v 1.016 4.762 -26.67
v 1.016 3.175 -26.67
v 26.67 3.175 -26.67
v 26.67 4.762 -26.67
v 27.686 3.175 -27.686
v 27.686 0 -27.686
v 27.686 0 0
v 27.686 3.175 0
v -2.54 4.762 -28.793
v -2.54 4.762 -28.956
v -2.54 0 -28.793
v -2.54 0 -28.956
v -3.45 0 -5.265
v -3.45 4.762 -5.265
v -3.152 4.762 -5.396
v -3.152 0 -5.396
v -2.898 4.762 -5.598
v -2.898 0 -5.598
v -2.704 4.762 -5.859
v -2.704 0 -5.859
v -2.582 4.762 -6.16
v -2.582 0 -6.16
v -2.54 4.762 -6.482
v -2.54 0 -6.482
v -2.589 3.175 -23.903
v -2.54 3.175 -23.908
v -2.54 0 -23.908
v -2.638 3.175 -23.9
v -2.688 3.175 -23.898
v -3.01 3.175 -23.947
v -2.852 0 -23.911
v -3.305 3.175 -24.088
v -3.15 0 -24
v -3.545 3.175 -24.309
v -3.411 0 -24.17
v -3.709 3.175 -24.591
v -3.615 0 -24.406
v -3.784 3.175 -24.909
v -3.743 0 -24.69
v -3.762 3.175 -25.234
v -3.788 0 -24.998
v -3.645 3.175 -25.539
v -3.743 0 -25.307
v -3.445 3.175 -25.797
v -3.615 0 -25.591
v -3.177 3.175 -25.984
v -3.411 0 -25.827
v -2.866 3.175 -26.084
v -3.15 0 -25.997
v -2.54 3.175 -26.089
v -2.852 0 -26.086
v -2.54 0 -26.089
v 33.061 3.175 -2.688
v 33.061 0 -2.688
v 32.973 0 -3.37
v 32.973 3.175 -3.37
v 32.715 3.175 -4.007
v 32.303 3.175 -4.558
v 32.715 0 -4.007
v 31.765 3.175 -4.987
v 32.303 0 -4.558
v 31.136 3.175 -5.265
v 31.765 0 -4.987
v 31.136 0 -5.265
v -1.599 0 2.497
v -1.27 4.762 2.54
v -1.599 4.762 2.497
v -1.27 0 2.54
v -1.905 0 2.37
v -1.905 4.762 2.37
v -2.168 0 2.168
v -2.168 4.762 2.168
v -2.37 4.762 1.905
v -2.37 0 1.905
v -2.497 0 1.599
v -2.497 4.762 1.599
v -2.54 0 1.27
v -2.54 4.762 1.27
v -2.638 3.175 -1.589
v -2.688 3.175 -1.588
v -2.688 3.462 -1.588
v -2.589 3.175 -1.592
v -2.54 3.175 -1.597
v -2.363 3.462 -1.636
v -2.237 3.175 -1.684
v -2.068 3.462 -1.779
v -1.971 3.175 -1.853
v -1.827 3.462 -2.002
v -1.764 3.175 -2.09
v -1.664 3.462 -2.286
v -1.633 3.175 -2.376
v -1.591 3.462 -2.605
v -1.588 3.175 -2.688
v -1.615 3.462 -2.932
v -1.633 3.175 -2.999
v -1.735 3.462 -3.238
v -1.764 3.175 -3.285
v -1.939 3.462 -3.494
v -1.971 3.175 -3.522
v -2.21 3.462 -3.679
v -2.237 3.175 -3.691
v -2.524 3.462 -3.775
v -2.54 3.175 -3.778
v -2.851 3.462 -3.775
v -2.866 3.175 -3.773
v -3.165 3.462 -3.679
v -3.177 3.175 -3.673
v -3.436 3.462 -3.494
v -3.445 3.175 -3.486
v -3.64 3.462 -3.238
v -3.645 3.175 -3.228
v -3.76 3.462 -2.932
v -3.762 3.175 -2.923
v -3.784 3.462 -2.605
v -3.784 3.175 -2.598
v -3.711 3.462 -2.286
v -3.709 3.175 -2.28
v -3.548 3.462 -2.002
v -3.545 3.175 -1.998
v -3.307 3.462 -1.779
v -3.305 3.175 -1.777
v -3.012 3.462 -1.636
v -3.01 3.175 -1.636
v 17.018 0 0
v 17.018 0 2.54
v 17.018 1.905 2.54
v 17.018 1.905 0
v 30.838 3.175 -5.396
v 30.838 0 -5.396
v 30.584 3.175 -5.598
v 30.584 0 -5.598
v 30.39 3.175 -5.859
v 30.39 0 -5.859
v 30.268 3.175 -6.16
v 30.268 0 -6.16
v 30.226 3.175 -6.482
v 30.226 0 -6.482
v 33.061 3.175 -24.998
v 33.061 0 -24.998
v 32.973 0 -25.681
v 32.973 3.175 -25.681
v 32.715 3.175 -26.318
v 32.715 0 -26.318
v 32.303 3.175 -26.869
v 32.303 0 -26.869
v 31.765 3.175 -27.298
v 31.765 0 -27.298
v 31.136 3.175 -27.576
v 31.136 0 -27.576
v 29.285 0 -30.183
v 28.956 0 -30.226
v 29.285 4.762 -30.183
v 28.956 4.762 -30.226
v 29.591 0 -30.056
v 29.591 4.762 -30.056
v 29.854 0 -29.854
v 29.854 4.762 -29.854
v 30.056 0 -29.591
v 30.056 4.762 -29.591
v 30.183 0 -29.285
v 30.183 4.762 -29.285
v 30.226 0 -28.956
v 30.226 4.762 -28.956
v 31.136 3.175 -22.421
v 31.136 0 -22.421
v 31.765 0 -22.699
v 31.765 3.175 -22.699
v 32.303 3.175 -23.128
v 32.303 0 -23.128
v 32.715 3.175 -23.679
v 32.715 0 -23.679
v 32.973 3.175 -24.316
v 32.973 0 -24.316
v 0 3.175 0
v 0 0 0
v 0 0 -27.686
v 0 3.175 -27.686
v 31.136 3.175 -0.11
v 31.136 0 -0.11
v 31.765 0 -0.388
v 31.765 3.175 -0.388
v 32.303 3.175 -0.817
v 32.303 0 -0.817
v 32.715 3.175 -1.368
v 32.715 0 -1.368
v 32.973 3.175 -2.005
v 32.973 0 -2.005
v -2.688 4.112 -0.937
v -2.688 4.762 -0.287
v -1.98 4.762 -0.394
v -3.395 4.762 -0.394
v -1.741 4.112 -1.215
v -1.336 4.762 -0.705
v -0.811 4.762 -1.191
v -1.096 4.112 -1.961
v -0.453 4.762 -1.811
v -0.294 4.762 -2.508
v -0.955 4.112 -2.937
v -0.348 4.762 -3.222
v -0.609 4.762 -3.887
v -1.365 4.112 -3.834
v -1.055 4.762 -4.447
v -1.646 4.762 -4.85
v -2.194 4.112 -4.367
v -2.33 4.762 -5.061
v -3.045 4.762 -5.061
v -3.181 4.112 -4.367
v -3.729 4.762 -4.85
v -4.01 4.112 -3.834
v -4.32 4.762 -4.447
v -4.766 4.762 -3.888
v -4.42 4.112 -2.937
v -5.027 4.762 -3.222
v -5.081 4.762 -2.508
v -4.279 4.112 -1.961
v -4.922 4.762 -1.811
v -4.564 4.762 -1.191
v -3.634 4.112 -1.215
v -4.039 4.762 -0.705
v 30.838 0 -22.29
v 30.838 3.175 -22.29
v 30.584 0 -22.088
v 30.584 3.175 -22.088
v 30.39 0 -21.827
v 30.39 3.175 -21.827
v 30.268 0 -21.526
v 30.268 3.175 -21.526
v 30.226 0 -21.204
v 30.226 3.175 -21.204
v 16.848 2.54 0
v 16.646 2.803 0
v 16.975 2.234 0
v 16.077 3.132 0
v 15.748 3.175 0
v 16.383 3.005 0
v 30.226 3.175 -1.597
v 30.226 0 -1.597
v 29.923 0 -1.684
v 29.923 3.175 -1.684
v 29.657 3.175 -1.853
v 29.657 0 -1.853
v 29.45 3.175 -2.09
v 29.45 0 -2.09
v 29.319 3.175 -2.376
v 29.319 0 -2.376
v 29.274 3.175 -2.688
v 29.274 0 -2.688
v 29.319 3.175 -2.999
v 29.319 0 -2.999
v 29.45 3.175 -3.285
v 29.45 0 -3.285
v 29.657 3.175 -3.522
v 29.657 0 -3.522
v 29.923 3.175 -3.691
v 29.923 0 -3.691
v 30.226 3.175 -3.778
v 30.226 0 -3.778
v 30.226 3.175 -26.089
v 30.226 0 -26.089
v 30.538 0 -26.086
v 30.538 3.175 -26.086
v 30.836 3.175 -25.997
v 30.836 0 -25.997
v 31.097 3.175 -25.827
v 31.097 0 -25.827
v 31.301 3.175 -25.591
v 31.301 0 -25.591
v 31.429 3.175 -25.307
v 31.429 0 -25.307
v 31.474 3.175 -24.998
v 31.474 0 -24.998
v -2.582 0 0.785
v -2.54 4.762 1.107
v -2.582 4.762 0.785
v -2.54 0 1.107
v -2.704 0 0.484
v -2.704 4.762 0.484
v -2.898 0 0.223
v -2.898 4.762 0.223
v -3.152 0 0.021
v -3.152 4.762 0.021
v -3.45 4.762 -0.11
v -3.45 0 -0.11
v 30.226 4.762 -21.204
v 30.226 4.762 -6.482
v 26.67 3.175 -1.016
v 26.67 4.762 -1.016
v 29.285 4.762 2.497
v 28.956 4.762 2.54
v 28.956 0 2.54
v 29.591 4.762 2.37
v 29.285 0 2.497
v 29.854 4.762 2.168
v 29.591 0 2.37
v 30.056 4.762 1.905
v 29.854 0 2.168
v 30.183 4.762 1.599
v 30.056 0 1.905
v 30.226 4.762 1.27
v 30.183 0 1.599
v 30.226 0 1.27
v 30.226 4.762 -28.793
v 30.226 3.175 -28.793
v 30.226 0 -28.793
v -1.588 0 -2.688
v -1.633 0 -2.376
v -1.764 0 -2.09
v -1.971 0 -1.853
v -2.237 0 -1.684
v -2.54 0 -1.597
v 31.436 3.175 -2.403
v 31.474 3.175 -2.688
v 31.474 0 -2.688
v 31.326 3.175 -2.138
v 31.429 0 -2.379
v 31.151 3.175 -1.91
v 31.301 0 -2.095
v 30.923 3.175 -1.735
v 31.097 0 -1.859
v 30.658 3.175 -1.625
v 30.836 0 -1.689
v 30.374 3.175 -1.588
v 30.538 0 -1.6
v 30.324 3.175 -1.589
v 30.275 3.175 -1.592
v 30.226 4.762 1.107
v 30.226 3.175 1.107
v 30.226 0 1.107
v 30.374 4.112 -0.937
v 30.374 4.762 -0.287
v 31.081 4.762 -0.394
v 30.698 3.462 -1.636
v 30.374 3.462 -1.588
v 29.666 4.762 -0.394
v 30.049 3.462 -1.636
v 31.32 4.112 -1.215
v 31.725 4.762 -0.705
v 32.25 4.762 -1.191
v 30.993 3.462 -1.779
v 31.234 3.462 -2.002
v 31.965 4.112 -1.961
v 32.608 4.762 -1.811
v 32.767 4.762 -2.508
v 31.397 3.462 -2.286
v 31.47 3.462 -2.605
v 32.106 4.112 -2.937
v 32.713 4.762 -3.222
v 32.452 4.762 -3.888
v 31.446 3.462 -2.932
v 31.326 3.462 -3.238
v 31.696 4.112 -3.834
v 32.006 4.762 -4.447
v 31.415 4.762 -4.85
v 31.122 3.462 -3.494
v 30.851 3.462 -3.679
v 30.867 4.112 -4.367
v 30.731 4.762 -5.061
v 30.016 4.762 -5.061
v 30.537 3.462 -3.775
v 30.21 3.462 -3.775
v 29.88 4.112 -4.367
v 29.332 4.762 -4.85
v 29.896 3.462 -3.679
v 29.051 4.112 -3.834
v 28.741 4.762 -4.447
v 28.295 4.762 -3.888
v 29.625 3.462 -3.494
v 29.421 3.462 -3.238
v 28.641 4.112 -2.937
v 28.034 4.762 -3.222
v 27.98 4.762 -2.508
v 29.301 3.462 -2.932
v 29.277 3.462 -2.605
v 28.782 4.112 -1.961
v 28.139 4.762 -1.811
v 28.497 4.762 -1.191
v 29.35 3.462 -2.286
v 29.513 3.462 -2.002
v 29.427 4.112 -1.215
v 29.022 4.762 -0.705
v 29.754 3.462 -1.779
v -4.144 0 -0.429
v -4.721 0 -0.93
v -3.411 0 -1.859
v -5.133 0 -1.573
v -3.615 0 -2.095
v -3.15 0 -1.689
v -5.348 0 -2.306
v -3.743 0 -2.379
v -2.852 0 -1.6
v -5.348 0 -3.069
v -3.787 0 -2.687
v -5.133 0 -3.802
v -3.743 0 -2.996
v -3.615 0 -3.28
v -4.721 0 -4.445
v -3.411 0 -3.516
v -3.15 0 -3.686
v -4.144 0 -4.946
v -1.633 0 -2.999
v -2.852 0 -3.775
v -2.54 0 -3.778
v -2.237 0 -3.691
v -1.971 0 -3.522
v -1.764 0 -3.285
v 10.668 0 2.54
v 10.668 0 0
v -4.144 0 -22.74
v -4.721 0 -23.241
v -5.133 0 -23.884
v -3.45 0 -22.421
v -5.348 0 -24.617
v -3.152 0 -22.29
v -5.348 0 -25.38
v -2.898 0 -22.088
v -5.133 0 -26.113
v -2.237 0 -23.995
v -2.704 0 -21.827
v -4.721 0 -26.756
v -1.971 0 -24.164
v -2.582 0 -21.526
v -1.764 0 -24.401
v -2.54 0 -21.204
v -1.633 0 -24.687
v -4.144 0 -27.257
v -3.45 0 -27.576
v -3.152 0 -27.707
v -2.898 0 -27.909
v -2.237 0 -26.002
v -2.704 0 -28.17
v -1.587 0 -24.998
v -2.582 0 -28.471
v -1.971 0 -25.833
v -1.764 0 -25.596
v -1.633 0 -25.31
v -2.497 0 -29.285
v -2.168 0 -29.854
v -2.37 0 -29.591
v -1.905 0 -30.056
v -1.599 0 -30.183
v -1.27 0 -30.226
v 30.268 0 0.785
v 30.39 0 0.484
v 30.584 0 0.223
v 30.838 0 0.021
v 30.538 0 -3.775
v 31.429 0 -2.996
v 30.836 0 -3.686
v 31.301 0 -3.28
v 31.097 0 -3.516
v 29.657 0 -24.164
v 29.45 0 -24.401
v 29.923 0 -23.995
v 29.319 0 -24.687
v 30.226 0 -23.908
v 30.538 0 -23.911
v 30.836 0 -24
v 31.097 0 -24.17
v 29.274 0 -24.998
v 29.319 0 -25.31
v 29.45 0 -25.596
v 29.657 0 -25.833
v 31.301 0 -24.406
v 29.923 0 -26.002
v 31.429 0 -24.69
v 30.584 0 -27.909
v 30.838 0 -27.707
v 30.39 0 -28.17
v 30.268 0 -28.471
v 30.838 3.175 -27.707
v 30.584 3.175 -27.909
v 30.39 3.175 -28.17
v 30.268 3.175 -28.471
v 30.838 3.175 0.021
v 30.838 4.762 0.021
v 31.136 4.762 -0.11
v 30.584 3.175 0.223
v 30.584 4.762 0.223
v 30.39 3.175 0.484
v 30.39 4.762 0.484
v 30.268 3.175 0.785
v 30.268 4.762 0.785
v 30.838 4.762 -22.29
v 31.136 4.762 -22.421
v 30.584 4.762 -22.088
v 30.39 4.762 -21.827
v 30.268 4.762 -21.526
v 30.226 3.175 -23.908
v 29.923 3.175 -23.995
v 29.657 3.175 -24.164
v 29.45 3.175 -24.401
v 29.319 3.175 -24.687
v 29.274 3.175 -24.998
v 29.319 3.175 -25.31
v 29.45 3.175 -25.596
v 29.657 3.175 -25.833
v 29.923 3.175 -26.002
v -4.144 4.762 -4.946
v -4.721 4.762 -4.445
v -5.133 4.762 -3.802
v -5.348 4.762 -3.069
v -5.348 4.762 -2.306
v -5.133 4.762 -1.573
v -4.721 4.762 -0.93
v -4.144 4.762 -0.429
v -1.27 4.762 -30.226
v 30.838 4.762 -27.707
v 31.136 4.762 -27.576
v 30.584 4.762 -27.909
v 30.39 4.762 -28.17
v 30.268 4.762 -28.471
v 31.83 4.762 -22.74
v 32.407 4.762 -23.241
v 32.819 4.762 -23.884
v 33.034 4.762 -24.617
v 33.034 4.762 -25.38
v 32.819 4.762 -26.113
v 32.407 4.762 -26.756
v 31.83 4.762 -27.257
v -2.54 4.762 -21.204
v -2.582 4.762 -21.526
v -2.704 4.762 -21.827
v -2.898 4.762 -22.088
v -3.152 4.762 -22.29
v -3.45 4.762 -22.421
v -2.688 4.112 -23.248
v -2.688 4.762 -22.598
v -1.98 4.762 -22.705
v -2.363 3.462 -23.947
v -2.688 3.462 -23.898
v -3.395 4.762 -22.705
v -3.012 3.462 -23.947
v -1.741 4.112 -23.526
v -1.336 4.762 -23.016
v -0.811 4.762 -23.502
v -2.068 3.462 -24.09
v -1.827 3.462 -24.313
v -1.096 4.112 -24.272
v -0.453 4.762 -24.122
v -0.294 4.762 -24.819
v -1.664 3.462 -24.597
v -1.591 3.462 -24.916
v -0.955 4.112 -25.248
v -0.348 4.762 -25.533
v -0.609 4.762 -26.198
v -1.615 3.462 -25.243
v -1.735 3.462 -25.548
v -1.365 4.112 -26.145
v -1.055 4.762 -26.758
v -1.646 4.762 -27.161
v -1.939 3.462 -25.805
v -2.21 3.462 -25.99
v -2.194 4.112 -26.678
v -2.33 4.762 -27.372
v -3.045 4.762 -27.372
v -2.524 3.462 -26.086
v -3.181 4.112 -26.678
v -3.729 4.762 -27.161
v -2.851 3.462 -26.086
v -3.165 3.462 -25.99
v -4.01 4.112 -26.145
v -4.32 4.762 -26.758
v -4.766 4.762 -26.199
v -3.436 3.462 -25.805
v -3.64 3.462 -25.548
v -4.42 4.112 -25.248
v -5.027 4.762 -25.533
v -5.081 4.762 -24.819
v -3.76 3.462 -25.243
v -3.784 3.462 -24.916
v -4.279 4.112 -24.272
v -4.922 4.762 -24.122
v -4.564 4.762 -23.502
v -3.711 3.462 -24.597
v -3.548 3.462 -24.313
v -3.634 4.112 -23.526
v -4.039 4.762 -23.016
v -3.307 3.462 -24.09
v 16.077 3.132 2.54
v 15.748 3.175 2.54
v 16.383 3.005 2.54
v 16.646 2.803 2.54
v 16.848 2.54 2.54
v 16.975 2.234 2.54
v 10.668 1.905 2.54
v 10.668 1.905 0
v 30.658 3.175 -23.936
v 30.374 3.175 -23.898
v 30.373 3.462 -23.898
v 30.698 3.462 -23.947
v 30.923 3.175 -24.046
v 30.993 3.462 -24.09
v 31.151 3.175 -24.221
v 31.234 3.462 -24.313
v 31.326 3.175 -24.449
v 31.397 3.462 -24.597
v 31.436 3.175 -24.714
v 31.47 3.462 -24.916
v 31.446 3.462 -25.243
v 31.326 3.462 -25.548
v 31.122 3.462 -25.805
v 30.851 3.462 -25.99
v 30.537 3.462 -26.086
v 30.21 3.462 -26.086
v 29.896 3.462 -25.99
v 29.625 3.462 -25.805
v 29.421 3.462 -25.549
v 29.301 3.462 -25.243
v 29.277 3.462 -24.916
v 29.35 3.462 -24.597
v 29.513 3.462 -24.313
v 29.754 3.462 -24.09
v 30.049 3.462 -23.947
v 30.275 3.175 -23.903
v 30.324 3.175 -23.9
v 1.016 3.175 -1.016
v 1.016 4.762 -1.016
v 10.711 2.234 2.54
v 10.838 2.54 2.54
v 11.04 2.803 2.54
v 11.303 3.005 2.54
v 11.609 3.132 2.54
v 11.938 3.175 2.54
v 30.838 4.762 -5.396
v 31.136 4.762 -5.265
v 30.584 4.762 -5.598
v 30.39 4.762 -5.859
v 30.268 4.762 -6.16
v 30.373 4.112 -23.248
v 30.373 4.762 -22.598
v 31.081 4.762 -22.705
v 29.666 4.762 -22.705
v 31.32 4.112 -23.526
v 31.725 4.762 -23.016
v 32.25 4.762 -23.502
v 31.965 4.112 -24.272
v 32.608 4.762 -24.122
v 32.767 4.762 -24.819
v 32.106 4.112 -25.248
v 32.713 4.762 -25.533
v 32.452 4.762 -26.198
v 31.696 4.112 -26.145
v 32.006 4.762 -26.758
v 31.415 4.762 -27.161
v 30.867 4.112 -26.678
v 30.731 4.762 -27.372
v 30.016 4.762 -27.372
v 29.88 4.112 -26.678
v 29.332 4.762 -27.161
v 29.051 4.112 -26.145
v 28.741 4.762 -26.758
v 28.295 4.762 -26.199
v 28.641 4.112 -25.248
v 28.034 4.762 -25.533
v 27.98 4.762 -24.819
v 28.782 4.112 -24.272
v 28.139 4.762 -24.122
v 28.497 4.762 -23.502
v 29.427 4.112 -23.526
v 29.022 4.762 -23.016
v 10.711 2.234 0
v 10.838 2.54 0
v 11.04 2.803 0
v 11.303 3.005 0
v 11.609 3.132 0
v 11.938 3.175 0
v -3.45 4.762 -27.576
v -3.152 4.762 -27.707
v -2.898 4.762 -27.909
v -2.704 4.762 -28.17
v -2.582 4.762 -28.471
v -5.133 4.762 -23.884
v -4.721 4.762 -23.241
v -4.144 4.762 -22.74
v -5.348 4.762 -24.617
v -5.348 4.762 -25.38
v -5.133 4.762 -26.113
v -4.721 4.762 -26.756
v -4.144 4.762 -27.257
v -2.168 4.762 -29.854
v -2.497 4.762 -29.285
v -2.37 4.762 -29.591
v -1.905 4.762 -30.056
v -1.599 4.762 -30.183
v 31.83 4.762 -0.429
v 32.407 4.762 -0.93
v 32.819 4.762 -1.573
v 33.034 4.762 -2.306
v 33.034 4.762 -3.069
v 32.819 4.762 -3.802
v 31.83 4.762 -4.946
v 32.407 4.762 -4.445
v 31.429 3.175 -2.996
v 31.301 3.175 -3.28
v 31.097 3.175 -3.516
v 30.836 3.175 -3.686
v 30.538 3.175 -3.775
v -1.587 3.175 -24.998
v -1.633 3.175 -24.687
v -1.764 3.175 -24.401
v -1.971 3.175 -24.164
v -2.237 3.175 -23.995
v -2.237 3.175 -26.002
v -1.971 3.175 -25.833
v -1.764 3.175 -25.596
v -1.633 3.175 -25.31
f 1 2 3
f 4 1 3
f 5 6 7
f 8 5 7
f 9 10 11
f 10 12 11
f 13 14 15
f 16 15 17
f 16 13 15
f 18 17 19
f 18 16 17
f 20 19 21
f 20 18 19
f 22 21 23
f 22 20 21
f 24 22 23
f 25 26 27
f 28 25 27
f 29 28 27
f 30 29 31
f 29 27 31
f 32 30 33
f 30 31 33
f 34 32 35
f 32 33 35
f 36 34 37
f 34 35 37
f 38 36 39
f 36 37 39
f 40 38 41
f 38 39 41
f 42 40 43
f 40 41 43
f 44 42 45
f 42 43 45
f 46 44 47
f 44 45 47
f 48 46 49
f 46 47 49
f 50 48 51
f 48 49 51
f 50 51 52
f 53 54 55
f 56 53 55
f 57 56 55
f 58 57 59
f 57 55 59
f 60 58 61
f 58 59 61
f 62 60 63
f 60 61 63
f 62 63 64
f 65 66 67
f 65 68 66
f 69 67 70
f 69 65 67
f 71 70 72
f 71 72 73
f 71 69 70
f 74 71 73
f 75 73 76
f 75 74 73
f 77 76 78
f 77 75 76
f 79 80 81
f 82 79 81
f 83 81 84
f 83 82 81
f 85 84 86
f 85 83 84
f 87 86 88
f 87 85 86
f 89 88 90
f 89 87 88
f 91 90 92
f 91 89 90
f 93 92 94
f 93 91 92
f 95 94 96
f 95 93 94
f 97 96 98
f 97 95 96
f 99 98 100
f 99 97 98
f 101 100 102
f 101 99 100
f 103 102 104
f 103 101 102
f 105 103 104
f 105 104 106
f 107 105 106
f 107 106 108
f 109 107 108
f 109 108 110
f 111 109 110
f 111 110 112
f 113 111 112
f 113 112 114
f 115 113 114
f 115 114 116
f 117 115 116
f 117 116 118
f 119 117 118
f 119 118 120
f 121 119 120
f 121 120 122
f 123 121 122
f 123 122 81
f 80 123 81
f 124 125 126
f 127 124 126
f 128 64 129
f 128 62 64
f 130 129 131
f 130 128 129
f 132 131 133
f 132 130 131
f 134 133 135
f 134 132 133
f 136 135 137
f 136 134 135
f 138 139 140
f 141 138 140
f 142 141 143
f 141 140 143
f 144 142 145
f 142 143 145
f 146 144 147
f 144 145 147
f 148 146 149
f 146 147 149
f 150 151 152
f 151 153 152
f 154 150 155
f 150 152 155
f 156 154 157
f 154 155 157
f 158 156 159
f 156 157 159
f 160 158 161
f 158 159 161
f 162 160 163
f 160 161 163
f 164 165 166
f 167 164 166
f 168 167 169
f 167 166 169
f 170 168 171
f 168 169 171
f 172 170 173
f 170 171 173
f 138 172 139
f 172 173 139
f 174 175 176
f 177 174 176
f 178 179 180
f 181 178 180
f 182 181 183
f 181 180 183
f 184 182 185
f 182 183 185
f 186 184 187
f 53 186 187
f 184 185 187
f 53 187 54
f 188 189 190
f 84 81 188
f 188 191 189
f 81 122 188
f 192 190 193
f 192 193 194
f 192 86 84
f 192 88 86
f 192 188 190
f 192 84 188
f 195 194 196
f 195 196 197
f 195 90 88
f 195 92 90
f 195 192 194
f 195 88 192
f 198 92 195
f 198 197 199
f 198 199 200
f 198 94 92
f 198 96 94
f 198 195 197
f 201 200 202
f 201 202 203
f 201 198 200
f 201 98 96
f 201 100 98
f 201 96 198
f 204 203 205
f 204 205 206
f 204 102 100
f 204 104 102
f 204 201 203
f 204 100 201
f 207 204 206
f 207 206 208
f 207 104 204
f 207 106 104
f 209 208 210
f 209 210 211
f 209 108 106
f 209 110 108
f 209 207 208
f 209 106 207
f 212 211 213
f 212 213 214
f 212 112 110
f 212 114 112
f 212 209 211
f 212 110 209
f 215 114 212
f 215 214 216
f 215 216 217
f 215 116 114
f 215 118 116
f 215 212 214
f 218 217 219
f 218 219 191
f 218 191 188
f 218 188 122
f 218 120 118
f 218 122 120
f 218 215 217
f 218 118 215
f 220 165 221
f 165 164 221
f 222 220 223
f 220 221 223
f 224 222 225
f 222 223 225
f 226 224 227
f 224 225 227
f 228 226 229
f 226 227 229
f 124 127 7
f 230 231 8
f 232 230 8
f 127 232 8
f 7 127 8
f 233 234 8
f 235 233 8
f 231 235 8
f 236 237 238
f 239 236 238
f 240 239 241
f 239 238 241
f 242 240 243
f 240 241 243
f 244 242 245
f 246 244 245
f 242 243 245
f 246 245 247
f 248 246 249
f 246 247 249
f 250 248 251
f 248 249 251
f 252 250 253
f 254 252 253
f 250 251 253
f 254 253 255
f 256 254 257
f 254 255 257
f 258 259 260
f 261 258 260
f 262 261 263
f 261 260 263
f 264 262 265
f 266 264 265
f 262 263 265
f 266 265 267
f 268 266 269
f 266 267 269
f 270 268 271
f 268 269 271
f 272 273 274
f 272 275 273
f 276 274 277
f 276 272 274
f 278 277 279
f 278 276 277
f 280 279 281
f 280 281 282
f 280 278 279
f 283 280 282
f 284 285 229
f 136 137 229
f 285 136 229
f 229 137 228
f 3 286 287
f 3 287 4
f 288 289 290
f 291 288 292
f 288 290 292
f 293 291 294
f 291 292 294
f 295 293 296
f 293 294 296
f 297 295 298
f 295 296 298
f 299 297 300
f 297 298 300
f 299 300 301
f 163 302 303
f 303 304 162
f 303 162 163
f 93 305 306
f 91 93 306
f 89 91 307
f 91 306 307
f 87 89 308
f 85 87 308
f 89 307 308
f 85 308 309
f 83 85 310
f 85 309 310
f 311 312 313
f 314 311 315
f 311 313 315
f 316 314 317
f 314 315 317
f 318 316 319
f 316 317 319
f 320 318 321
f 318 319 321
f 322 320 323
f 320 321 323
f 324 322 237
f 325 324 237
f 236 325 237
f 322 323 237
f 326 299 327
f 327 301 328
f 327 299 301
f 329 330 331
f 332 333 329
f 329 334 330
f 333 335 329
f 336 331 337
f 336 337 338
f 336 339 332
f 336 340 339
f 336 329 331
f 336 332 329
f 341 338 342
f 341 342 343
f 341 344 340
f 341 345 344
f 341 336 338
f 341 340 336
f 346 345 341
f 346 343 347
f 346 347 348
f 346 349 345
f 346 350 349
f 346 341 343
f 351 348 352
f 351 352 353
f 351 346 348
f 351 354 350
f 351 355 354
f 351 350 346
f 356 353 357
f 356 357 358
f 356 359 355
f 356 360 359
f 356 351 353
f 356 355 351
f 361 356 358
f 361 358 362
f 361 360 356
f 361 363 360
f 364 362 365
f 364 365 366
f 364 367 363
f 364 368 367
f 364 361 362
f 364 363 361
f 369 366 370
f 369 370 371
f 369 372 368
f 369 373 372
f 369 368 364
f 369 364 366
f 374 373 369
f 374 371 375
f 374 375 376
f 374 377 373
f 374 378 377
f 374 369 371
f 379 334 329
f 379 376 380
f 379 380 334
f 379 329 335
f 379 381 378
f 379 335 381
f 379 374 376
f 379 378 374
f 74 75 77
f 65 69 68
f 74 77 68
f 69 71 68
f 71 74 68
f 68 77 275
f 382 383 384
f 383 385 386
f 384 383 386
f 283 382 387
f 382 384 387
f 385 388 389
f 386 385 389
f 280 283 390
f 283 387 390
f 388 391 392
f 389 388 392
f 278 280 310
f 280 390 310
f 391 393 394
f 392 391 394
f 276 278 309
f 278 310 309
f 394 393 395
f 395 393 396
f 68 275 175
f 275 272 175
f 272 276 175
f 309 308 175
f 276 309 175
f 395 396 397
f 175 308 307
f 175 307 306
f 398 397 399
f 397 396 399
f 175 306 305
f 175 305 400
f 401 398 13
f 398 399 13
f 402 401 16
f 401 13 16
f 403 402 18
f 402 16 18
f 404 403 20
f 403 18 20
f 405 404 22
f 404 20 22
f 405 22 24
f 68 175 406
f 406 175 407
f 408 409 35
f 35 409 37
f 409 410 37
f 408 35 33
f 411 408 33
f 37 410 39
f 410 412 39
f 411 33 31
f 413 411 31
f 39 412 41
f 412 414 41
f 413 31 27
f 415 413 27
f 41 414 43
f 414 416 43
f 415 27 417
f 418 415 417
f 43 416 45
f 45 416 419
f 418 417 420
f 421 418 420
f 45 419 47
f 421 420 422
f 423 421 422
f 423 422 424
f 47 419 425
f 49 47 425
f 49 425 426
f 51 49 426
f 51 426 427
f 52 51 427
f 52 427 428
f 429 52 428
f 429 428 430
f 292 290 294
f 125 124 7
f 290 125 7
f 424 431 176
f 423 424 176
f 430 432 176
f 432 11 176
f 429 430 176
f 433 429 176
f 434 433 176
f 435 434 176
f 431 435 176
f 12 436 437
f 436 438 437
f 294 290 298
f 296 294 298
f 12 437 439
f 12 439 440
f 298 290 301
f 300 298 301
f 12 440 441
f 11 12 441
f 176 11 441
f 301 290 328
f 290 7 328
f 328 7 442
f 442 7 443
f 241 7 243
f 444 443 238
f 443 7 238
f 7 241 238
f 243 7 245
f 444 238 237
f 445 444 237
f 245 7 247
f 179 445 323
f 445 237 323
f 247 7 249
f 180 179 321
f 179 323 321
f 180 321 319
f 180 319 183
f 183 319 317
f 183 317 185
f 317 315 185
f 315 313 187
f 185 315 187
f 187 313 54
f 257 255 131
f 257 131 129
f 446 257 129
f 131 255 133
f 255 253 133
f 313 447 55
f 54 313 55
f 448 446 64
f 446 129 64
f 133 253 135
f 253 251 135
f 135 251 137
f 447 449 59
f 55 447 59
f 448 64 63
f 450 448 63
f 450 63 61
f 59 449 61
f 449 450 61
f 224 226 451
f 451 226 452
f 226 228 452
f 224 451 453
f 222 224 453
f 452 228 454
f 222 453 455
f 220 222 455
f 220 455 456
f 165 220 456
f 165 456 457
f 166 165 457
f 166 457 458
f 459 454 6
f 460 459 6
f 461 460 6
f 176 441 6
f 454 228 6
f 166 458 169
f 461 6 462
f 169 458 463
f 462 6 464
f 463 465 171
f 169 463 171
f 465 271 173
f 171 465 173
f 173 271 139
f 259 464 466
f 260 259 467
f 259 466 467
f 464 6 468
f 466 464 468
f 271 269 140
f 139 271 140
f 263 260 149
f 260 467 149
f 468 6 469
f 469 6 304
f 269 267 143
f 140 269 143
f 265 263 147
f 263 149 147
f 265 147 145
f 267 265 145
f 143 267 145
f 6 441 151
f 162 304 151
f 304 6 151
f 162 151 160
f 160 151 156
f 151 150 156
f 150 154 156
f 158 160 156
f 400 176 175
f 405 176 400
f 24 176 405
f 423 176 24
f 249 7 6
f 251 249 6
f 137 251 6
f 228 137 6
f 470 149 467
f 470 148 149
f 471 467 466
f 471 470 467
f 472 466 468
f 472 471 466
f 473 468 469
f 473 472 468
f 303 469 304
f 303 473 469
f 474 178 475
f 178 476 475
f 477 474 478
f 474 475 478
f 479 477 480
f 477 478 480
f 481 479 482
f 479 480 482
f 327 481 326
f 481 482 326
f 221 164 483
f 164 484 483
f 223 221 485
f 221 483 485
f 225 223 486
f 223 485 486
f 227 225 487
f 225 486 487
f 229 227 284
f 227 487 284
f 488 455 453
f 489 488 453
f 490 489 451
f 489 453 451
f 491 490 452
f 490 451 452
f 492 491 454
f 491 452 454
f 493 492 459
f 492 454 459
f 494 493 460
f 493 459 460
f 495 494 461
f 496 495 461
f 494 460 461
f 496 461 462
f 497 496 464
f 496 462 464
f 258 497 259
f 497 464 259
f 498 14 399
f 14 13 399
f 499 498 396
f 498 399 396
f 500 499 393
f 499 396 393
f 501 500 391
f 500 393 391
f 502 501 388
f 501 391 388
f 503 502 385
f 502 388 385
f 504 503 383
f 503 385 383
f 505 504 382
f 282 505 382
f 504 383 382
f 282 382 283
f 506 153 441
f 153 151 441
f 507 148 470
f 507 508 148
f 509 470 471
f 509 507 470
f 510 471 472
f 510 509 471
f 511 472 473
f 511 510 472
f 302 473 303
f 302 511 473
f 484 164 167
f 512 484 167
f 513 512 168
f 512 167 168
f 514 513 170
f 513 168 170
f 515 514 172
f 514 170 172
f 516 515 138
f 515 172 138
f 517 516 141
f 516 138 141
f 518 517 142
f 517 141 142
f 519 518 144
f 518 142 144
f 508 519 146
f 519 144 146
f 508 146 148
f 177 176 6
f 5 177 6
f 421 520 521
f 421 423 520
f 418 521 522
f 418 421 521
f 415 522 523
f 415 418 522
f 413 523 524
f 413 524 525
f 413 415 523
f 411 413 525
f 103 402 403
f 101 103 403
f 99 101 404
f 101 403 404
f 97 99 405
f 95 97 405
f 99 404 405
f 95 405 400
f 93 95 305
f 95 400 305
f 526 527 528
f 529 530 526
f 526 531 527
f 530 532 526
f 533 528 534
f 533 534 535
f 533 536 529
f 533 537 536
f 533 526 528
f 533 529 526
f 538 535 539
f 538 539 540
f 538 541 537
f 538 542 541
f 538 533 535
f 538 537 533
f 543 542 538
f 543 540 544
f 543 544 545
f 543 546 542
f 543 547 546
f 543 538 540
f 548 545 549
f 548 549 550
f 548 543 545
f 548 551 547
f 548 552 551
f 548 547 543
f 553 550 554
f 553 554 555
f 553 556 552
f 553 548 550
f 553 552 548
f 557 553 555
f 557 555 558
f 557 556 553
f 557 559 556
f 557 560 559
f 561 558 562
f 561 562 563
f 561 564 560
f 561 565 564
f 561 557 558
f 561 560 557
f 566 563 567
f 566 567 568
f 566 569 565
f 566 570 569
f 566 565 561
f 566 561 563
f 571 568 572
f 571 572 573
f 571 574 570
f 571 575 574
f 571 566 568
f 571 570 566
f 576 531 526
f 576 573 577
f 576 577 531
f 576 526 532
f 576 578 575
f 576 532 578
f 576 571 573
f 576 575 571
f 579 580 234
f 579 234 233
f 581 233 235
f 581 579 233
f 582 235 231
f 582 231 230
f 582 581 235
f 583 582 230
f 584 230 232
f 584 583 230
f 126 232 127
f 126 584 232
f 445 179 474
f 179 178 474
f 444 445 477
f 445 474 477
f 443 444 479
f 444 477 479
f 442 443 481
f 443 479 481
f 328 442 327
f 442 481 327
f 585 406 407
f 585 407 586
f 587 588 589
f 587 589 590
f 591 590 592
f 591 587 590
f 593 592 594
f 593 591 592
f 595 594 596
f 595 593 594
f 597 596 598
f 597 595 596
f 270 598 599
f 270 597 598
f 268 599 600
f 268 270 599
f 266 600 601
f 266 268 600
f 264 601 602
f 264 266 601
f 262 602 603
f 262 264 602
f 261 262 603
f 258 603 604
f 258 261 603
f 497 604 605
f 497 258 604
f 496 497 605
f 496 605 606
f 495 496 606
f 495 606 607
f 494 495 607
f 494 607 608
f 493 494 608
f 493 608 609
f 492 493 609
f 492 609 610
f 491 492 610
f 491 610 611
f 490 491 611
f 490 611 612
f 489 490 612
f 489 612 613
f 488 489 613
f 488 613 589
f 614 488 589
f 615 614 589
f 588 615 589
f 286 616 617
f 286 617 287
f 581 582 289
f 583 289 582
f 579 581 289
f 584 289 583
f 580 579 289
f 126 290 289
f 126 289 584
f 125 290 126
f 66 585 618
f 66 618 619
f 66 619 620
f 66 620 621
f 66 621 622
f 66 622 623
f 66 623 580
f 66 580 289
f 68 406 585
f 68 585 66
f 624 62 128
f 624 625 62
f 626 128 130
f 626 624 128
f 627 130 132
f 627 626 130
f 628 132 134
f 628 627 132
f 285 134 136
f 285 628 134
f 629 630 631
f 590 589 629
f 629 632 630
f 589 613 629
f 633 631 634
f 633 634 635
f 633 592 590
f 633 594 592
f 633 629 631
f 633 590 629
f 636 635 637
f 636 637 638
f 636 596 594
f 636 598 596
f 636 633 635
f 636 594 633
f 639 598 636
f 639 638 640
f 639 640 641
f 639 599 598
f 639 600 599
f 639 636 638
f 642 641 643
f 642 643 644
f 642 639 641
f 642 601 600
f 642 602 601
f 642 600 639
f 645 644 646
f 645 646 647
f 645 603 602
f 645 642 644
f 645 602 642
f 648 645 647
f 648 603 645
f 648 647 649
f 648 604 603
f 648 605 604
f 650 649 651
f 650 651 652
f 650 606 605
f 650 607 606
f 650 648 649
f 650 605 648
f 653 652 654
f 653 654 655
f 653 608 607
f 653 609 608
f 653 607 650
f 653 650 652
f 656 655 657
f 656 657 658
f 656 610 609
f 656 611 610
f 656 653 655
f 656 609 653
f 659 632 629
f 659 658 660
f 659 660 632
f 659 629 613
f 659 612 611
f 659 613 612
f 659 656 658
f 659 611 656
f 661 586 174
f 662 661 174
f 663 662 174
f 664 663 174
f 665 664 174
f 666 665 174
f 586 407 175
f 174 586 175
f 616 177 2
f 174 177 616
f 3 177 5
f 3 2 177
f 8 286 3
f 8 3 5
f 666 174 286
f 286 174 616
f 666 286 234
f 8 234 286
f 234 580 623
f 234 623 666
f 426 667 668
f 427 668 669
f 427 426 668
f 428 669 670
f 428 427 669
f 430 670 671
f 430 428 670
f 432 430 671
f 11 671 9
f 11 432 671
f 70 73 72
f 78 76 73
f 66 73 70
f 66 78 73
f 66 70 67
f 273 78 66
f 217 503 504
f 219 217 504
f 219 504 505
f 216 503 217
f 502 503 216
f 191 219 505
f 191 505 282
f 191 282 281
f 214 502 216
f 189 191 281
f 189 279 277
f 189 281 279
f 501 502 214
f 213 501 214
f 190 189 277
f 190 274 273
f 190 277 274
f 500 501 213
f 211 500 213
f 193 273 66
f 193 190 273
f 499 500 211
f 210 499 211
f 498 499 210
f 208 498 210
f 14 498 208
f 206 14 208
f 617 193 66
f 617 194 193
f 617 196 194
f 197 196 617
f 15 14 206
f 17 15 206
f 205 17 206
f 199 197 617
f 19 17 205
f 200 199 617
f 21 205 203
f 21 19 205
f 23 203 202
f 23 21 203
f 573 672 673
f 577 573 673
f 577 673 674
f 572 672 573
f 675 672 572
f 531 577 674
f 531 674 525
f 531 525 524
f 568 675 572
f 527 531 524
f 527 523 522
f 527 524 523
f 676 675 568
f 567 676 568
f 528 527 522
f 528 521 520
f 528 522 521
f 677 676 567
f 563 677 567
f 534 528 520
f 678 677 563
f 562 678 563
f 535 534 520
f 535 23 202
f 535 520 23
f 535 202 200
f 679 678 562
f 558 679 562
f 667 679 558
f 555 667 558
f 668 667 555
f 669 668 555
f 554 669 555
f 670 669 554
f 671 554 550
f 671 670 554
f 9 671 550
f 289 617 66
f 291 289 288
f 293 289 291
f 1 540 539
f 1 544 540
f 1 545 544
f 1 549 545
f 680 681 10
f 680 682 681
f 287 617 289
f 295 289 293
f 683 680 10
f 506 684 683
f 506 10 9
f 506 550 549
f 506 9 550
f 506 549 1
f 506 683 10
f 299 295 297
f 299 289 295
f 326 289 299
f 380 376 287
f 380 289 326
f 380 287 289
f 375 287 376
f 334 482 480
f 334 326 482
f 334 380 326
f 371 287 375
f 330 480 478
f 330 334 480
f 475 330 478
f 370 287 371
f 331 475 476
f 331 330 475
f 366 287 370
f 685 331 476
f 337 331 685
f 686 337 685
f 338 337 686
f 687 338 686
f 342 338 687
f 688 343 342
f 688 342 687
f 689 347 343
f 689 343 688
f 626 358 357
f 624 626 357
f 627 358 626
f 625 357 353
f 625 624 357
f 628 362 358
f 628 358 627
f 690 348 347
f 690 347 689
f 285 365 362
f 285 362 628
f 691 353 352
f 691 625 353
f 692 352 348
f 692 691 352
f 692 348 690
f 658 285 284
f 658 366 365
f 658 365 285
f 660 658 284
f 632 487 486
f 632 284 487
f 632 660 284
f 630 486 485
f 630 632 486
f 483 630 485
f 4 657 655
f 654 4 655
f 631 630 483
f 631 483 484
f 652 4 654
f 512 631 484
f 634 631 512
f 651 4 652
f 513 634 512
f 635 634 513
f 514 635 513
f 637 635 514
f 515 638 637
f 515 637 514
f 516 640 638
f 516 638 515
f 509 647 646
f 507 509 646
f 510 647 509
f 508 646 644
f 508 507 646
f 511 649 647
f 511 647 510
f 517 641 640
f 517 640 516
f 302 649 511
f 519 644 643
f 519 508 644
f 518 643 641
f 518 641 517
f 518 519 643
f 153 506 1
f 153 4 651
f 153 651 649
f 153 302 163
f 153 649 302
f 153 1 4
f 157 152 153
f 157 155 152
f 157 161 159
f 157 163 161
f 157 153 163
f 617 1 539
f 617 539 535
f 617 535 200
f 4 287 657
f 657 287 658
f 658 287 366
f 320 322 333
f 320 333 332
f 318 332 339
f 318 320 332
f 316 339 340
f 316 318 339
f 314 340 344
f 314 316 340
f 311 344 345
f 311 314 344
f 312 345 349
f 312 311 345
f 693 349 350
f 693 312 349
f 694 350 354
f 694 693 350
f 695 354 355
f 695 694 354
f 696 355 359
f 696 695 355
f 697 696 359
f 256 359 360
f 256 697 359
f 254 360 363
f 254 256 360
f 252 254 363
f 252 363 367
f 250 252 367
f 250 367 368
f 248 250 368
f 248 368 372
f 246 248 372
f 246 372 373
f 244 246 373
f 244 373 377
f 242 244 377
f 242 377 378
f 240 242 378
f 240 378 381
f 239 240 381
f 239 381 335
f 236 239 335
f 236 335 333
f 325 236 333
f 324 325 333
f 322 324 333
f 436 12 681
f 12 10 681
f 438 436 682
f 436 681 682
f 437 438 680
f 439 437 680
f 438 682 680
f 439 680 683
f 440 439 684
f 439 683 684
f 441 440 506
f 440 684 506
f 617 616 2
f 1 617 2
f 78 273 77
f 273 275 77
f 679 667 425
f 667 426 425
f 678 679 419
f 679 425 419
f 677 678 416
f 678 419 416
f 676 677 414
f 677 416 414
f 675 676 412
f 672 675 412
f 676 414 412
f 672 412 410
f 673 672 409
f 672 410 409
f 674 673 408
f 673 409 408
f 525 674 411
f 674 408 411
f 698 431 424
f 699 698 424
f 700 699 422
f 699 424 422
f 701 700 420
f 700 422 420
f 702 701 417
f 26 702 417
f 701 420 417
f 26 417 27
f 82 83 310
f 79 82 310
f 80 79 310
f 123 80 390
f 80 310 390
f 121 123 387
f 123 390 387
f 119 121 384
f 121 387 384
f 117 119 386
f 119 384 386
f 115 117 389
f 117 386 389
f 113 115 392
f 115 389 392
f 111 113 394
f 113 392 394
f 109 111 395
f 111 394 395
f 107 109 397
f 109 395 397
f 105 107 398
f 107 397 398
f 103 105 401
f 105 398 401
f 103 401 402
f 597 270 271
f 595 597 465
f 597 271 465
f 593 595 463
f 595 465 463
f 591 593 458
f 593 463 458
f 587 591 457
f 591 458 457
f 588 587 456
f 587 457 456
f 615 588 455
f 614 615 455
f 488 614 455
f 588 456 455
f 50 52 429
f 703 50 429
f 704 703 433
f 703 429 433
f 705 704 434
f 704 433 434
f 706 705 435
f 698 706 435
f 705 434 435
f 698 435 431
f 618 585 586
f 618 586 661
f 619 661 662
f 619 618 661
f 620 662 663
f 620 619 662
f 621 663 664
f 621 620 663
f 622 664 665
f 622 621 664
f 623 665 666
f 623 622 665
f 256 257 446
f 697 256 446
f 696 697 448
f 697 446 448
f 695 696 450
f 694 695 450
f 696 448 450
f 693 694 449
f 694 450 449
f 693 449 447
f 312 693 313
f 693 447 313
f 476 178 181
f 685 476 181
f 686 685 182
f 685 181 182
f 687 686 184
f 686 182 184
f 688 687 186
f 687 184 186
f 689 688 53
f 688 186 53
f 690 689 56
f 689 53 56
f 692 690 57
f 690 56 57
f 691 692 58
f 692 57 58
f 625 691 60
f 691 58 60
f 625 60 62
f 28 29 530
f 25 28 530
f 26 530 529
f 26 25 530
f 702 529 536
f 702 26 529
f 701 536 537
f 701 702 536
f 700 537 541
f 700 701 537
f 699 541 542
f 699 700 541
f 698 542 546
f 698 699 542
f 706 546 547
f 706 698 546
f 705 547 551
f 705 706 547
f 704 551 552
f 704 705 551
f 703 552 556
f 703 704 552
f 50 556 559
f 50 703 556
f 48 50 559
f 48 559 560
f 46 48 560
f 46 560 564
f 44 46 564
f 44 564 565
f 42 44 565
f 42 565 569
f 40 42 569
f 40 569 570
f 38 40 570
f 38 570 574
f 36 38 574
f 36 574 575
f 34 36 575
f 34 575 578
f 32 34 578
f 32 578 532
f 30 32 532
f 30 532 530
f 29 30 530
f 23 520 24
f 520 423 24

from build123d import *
from build123d.topology import SkipClean

# Parameters (mm, degrees)
BOSS_EXTRUDE1_DEPTH            = 3.175
SKETCH2_R                      = 1.1
SKETCH2_W                      = 27.686
SKETCH2_H                      = 27.686
SKETCH2_W_2                    = 25.654
SKETCH2_H_2                    = 25.654
BOSS_EXTRUDE2_DEPTH            = 1.5875
CHAMFER1_SIZE                  = 1.3
FILLET1_R                      = 1.27
CUT_EXTRUDE1_REACH             = 48.79
SKETCH3_W                      = 6.35
SKETCH3_H                      = 3.175
CUT_EXTRUDE1_DIRECTION_2_DEPTH = 47.790190032
FILLET2_R                      = 1.27


with BuildPart() as part:
    # Sketch1 → Boss-Extrude1 (new body)
    with BuildSketch(Plane(origin=(0, 0, 0), x_dir=(1, 0, 0), z_dir=(0, 1, 0))):
        with BuildLine():
            ThreePointArc((-2.54, 27.681949273), (-5.375, 24.9985), (-2.54, 22.315050727))
            Line((-2.54, 22.315050727), (-2.54, 23.908434062))
            ThreePointArc((-2.54, 23.908434062), (-3.7875, 24.9985), (-2.54, 26.088565938))
            Line((-2.54, 26.088565938), (-2.54, 27.681949273))
        make_face()
        with BuildLine():
            Line((-2.54, 23.908434062), (-2.54, 22.315050727))
            ThreePointArc((-2.54, 22.315050727), (-0.735697948, 23.151035521), (0, 24.9985))
            ThreePointArc((0, 24.9985), (-0.735697948, 26.845964479), (-2.54, 27.681949273))
            Line((-2.54, 27.681949273), (-2.54, 26.088565938))
            ThreePointArc((-2.54, 26.088565938), (-1.859173374, 25.722292097), (-1.5875, 24.9985))
            ThreePointArc((-1.5875, 24.9985), (-1.859173374, 24.274707903), (-2.54, 23.908434062))
        make_face()
        with BuildLine():
            ThreePointArc((-2.54, 27.681949273), (-0.735697948, 26.845964479), (0, 24.9985))
            Line((0, 24.9985), (0, 27.686))
            Line((0, 27.686), (27.686, 27.686))
            Line((27.686, 27.686), (27.686, 24.9985))
            ThreePointArc((27.686, 24.9985), (28.421697948, 26.845964479), (30.226, 27.681949273))
            Line((30.226, 27.681949273), (30.226, 30.226))
            Line((30.226, 30.226), (-2.54, 30.226))
            Line((-2.54, 30.226), (-2.54, 27.681949273))
        make_face()
        with BuildLine():
            ThreePointArc((-2.54, 27.681949273), (-5.375, 24.9985), (-2.54, 22.315050727))
            Line((-2.54, 22.315050727), (-2.54, 23.908434062))
            ThreePointArc((-2.54, 23.908434062), (-3.7875, 24.9985), (-2.54, 26.088565938))
            Line((-2.54, 26.088565938), (-2.54, 27.681949273))
        make_face()
        with BuildLine():
            Line((-2.54, 23.908434062), (-2.54, 22.315050727))
            ThreePointArc((-2.54, 22.315050727), (-0.735697948, 23.151035521), (0, 24.9985))
            ThreePointArc((0, 24.9985), (-0.735697948, 26.845964479), (-2.54, 27.681949273))
            Line((-2.54, 27.681949273), (-2.54, 26.088565938))
            ThreePointArc((-2.54, 26.088565938), (-1.859173374, 25.722292097), (-1.5875, 24.9985))
            ThreePointArc((-1.5875, 24.9985), (-1.859173374, 24.274707903), (-2.54, 23.908434062))
        make_face()
        with BuildLine():
            ThreePointArc((-2.54, 5.370949273), (-5.375, 2.6875), (-2.54, 0.004050727))
            Line((-2.54, 0.004050727), (-2.54, 1.597434062))
            ThreePointArc((-2.54, 1.597434062), (-3.7875, 2.6875), (-2.54, 3.777565938))
            Line((-2.54, 3.777565938), (-2.54, 5.370949273))
        make_face()
        with BuildLine():
            Line((-2.54, 1.597434062), (-2.54, 0.004050727))
            ThreePointArc((-2.54, 0.004050727), (-0.735697948, 0.840035521), (0, 2.6875))
            ThreePointArc((0, 2.6875), (-0.735697948, 4.534964479), (-2.54, 5.370949273))
            Line((-2.54, 5.370949273), (-2.54, 3.777565938))
            ThreePointArc((-2.54, 3.777565938), (-1.859173374, 3.411292097), (-1.5875, 2.6875))
            ThreePointArc((-1.5875, 2.6875), (-1.859173374, 1.963707903), (-2.54, 1.597434062))
        make_face()
        with BuildLine():
            ThreePointArc((-2.54, 5.370949273), (-5.375, 2.6875), (-2.54, 0.004050727))
            Line((-2.54, 0.004050727), (-2.54, 1.597434062))
            ThreePointArc((-2.54, 1.597434062), (-3.7875, 2.6875), (-2.54, 3.777565938))
            Line((-2.54, 3.777565938), (-2.54, 5.370949273))
        make_face()
        with BuildLine():
            Line((-2.54, 1.597434062), (-2.54, 0.004050727))
            ThreePointArc((-2.54, 0.004050727), (-0.735697948, 0.840035521), (0, 2.6875))
            ThreePointArc((0, 2.6875), (-0.735697948, 4.534964479), (-2.54, 5.370949273))
            Line((-2.54, 5.370949273), (-2.54, 3.777565938))
            ThreePointArc((-2.54, 3.777565938), (-1.859173374, 3.411292097), (-1.5875, 2.6875))
            ThreePointArc((-1.5875, 2.6875), (-1.859173374, 1.963707903), (-2.54, 1.597434062))
        make_face()
        with BuildLine():
            Line((-2.54, 22.315050727), (-2.54, 5.370949273))
            ThreePointArc((-2.54, 5.370949273), (-0.735697948, 4.534964479), (0, 2.6875))
            Line((0, 2.6875), (0, 24.9985))
            ThreePointArc((0, 24.9985), (-0.735697948, 23.151035521), (-2.54, 22.315050727))
        make_face()
        with BuildLine():
            Line((-2.54, 0.004050727), (-2.54, -2.54))
            Line((-2.54, -2.54), (30.226, -2.54))
            Line((30.226, -2.54), (30.226, 0.004050727))
            ThreePointArc((30.226, 0.004050727), (28.421697948, 0.840035521), (27.686, 2.6875))
            Line((27.686, 2.6875), (27.686, 0))
            Line((27.686, 0), (0, 0))
            Line((0, 0), (0, 2.6875))
            ThreePointArc((0, 2.6875), (-0.735697948, 0.840035521), (-2.54, 0.004050727))
        make_face()
        with BuildLine():
            Line((27.686, 24.9985), (27.686, 2.6875))
            ThreePointArc((27.686, 2.6875), (28.421697948, 4.534964479), (30.226, 5.370949273))
            Line((30.226, 5.370949273), (30.226, 22.315050727))
            ThreePointArc((30.226, 22.315050727), (28.421697948, 23.151035521), (27.686, 24.9985))
        make_face()
        with BuildLine():
            ThreePointArc((27.686, 2.6875), (28.421697948, 0.840035521), (30.226, 0.004050727))
            Line((30.226, 0.004050727), (30.226, 1.597434062))
            ThreePointArc((30.226, 1.597434062), (29.2735, 2.6875), (30.226, 3.777565938))
            Line((30.226, 3.777565938), (30.226, 5.370949273))
            ThreePointArc((30.226, 5.370949273), (28.421697948, 4.534964479), (27.686, 2.6875))
        make_face()
        with BuildLine():
            Line((30.226, 1.597434062), (30.226, 0.004050727))
            ThreePointArc((30.226, 0.004050727), (32.220964479, 0.735697948), (33.061, 2.6875))
            ThreePointArc((33.061, 2.6875), (32.220964479, 4.639302052), (30.226, 5.370949273))
            Line((30.226, 5.370949273), (30.226, 3.777565938))
            ThreePointArc((30.226, 3.777565938), (31.097292097, 3.515826626), (31.4735, 2.6875))
            ThreePointArc((31.4735, 2.6875), (31.097292097, 1.859173374), (30.226, 1.597434062))
        make_face()
        with BuildLine():
            ThreePointArc((27.686, 2.6875), (28.421697948, 0.840035521), (30.226, 0.004050727))
            Line((30.226, 0.004050727), (30.226, 1.597434062))
            ThreePointArc((30.226, 1.597434062), (29.2735, 2.6875), (30.226, 3.777565938))
            Line((30.226, 3.777565938), (30.226, 5.370949273))
            ThreePointArc((30.226, 5.370949273), (28.421697948, 4.534964479), (27.686, 2.6875))
        make_face()
        with BuildLine():
            Line((30.226, 1.597434062), (30.226, 0.004050727))
            ThreePointArc((30.226, 0.004050727), (32.220964479, 0.735697948), (33.061, 2.6875))
            ThreePointArc((33.061, 2.6875), (32.220964479, 4.639302052), (30.226, 5.370949273))
            Line((30.226, 5.370949273), (30.226, 3.777565938))
            ThreePointArc((30.226, 3.777565938), (31.097292097, 3.515826626), (31.4735, 2.6875))
            ThreePointArc((31.4735, 2.6875), (31.097292097, 1.859173374), (30.226, 1.597434062))
        make_face()
        with BuildLine():
            ThreePointArc((30.226, 27.681949273), (28.421697948, 26.845964479), (27.686, 24.9985))
            ThreePointArc((27.686, 24.9985), (28.421697948, 23.151035521), (30.226, 22.315050727))
            Line((30.226, 22.315050727), (30.226, 23.908434062))
            ThreePointArc((30.226, 23.908434062), (29.2735, 24.9985), (30.226, 26.088565938))
            Line((30.226, 26.088565938), (30.226, 27.681949273))
        make_face()
        with BuildLine():
            ThreePointArc((33.061, 24.9985), (32.220964479, 26.950302052), (30.226, 27.681949273))
            Line((30.226, 27.681949273), (30.226, 26.088565938))
            ThreePointArc((30.226, 26.088565938), (31.097292097, 25.826826626), (31.4735, 24.9985))
            ThreePointArc((31.4735, 24.9985), (31.097292097, 24.170173374), (30.226, 23.908434062))
            Line((30.226, 23.908434062), (30.226, 22.315050727))
            ThreePointArc((30.226, 22.315050727), (32.220964479, 23.046697948), (33.061, 24.9985))
        make_face()
        with BuildLine():
            ThreePointArc((30.226, 27.681949273), (28.421697948, 26.845964479), (27.686, 24.9985))
            ThreePointArc((27.686, 24.9985), (28.421697948, 23.151035521), (30.226, 22.315050727))
            Line((30.226, 22.315050727), (30.226, 23.908434062))
            ThreePointArc((30.226, 23.908434062), (29.2735, 24.9985), (30.226, 26.088565938))
            Line((30.226, 26.088565938), (30.226, 27.681949273))
        make_face()
        with BuildLine():
            ThreePointArc((33.061, 24.9985), (32.220964479, 26.950302052), (30.226, 27.681949273))
            Line((30.226, 27.681949273), (30.226, 26.088565938))
            ThreePointArc((30.226, 26.088565938), (31.097292097, 25.826826626), (31.4735, 24.9985))
            ThreePointArc((31.4735, 24.9985), (31.097292097, 24.170173374), (30.226, 23.908434062))
            Line((30.226, 23.908434062), (30.226, 22.315050727))
            ThreePointArc((30.226, 22.315050727), (32.220964479, 23.046697948), (33.061, 24.9985))
        make_face()
    extrude(amount=BOSS_EXTRUDE1_DEPTH)

    # Sketch2 → Boss-Extrude2 (add)
    # profile 1 of 2: a face of its own
    with SkipClean():  # the faces are left unmerged after this step: merging them gives an invalid solid
        with BuildSketch(Plane(origin=(0, 3.175, 0), x_dir=(1, 0, 0), z_dir=(0, 1, 0))):
            with BuildLine():
                Line((30.226, -2.54), (30.226, 0.004050727))
                ThreePointArc((30.226, 0.004050727), (33.061, 2.6875), (30.226, 5.370949273))
                Line((30.226, 5.370949273), (30.226, 22.315050727))
                ThreePointArc((30.226, 22.315050727), (33.061, 24.9985), (30.226, 27.681949273))
                Line((30.226, 27.681949273), (30.226, 30.226))
                Line((30.226, 30.226), (-2.54, 30.226))
                Line((-2.54, 30.226), (-2.54, 27.681949273))
                ThreePointArc((-2.54, 27.681949273), (-5.375, 24.9985), (-2.54, 22.315050727))
                Line((-2.54, 22.315050727), (-2.54, 5.370949273))
                ThreePointArc((-2.54, 5.370949273), (-5.375, 2.6875), (-2.54, 0.004050727))
                Line((-2.54, 0.004050727), (-2.54, -2.54))
                Line((-2.54, -2.54), (30.226, -2.54))
            make_face()
            with Locations(Location((30.3735, 2.6875, 0), (0, 0, 270))):
                Circle(SKETCH2_R, mode=Mode.SUBTRACT)
            with Locations(Location((30.3735, 24.9985, 0), (0, 0, 270))):
                Circle(SKETCH2_R, mode=Mode.SUBTRACT)
            with Locations(Location((-2.6875, 24.9985, 0), (0, 0, 270))):
                Circle(SKETCH2_R, mode=Mode.SUBTRACT)
            with Locations(Location((-2.6875, 2.6875, 0), (0, 0, 270))):
                Circle(SKETCH2_R, mode=Mode.SUBTRACT)
            with Locations((13.843, 13.843)):
                Rectangle(SKETCH2_W, SKETCH2_H, mode=Mode.SUBTRACT)
        # profile 2 of 2: a face of its own
        with BuildSketch(Plane(origin=(0, 3.175, 0), x_dir=(1, 0, 0), z_dir=(0, 1, 0))):
            with Locations((13.843, 13.843)):
                Rectangle(SKETCH2_W, SKETCH2_H)
            with Locations((13.843, 13.843)):
                Rectangle(SKETCH2_W_2, SKETCH2_H_2, mode=Mode.SUBTRACT)
        extrude(amount=BOSS_EXTRUDE2_DEPTH)

    # Chamfer1
    chamfer1_edges = [part.edges().sort_by_distance(p)[0] for p in [
        (30.3735, 4.7625, -3.7875),
        (30.3735, 4.7625, -26.0985),
        (-2.6875, 4.7625, -26.0985),
        (-2.6875, 4.7625, -3.7875),
    ]]
    chamfer(chamfer1_edges, length=CHAMFER1_SIZE)

    # Fillet1
    fillet1_edges = [part.edges().sort_by_distance(p)[0] for p in [
        (30.226, 1.5875, -0.004050727),
        (30.226, 1.5875, 2.54),
        (-2.54, 1.5875, 2.54),
        (-2.54, 1.5875, -0.004050727),
        (-2.54, 1.5875, -5.370949273),
        (-2.54, 1.5875, -22.315050727),
        (-2.54, 1.5875, -27.681949273),
        (-2.54, 1.5875, -30.226),
        (30.226, 1.5875, -30.226),
        (30.226, 1.5875, -27.681949273),
        (30.226, 1.5875, -22.315050727),
        (30.226, 1.5875, -5.370949273),
    ]]
    fillet(fillet1_edges, radius=FILLET1_R)

    # Sketch3 → Cut-Extrude1 (cut, up to next)
    with BuildSketch(Plane.XY.offset(2.54), mode=Mode.PRIVATE) as cut_extrude1_sk1:
        with Locations((13.843, 1.5875)):
            Rectangle(SKETCH3_W, SKETCH3_H)
    cut_extrude1_tool1 = extrude(cut_extrude1_sk1.sketch, amount=-CUT_EXTRUDE1_REACH, mode=Mode.PRIVATE) & part.part
    add(cut_extrude1_tool1.solids().sort_by_distance((13.843, 1.5875, 2.54))[0], mode=Mode.SUBTRACT)

    # Sketch3 → Cut-Extrude1 direction 2 (cut)
    with SkipClean():  # the faces are left unmerged after this step: merging them gives an invalid solid
        with BuildSketch(Plane.XY.offset(2.54)):
            with Locations((13.843, 1.5875)):
                Rectangle(SKETCH3_W, SKETCH3_H)
        extrude(amount=CUT_EXTRUDE1_DIRECTION_2_DEPTH, mode=Mode.SUBTRACT)

    # Fillet2
    # the kernel refuses this fillet: 1.27 mm, written as the material it adds along each edge
    with BuildSketch(Plane(origin=(17.018, 3.175, 2.54), x_dir=(-1, 0, 0), z_dir=(0, 0, -1))) as fillet2_piece_1:
        with BuildLine():
            CenterArc((FILLET2_R, -FILLET2_R), FILLET2_R, 90, 90)
            Line((0, -FILLET2_R), (0, 0))
            Line((0, 0), (FILLET2_R, 0))
        make_face()
    extrude(amount=2.54)
    with BuildSketch(Plane(origin=(10.668, 3.175, 2.54), x_dir=(1, 0, 0), z_dir=(0, 0, -1))) as fillet2_piece_2:
        with BuildLine():
            CenterArc((FILLET2_R, FILLET2_R), FILLET2_R, 180, 90)
            Line((0, FILLET2_R), (0, 0))
            Line((0, 0), (FILLET2_R, 0))
        make_face()
    extrude(amount=2.54)


solid = part.part
